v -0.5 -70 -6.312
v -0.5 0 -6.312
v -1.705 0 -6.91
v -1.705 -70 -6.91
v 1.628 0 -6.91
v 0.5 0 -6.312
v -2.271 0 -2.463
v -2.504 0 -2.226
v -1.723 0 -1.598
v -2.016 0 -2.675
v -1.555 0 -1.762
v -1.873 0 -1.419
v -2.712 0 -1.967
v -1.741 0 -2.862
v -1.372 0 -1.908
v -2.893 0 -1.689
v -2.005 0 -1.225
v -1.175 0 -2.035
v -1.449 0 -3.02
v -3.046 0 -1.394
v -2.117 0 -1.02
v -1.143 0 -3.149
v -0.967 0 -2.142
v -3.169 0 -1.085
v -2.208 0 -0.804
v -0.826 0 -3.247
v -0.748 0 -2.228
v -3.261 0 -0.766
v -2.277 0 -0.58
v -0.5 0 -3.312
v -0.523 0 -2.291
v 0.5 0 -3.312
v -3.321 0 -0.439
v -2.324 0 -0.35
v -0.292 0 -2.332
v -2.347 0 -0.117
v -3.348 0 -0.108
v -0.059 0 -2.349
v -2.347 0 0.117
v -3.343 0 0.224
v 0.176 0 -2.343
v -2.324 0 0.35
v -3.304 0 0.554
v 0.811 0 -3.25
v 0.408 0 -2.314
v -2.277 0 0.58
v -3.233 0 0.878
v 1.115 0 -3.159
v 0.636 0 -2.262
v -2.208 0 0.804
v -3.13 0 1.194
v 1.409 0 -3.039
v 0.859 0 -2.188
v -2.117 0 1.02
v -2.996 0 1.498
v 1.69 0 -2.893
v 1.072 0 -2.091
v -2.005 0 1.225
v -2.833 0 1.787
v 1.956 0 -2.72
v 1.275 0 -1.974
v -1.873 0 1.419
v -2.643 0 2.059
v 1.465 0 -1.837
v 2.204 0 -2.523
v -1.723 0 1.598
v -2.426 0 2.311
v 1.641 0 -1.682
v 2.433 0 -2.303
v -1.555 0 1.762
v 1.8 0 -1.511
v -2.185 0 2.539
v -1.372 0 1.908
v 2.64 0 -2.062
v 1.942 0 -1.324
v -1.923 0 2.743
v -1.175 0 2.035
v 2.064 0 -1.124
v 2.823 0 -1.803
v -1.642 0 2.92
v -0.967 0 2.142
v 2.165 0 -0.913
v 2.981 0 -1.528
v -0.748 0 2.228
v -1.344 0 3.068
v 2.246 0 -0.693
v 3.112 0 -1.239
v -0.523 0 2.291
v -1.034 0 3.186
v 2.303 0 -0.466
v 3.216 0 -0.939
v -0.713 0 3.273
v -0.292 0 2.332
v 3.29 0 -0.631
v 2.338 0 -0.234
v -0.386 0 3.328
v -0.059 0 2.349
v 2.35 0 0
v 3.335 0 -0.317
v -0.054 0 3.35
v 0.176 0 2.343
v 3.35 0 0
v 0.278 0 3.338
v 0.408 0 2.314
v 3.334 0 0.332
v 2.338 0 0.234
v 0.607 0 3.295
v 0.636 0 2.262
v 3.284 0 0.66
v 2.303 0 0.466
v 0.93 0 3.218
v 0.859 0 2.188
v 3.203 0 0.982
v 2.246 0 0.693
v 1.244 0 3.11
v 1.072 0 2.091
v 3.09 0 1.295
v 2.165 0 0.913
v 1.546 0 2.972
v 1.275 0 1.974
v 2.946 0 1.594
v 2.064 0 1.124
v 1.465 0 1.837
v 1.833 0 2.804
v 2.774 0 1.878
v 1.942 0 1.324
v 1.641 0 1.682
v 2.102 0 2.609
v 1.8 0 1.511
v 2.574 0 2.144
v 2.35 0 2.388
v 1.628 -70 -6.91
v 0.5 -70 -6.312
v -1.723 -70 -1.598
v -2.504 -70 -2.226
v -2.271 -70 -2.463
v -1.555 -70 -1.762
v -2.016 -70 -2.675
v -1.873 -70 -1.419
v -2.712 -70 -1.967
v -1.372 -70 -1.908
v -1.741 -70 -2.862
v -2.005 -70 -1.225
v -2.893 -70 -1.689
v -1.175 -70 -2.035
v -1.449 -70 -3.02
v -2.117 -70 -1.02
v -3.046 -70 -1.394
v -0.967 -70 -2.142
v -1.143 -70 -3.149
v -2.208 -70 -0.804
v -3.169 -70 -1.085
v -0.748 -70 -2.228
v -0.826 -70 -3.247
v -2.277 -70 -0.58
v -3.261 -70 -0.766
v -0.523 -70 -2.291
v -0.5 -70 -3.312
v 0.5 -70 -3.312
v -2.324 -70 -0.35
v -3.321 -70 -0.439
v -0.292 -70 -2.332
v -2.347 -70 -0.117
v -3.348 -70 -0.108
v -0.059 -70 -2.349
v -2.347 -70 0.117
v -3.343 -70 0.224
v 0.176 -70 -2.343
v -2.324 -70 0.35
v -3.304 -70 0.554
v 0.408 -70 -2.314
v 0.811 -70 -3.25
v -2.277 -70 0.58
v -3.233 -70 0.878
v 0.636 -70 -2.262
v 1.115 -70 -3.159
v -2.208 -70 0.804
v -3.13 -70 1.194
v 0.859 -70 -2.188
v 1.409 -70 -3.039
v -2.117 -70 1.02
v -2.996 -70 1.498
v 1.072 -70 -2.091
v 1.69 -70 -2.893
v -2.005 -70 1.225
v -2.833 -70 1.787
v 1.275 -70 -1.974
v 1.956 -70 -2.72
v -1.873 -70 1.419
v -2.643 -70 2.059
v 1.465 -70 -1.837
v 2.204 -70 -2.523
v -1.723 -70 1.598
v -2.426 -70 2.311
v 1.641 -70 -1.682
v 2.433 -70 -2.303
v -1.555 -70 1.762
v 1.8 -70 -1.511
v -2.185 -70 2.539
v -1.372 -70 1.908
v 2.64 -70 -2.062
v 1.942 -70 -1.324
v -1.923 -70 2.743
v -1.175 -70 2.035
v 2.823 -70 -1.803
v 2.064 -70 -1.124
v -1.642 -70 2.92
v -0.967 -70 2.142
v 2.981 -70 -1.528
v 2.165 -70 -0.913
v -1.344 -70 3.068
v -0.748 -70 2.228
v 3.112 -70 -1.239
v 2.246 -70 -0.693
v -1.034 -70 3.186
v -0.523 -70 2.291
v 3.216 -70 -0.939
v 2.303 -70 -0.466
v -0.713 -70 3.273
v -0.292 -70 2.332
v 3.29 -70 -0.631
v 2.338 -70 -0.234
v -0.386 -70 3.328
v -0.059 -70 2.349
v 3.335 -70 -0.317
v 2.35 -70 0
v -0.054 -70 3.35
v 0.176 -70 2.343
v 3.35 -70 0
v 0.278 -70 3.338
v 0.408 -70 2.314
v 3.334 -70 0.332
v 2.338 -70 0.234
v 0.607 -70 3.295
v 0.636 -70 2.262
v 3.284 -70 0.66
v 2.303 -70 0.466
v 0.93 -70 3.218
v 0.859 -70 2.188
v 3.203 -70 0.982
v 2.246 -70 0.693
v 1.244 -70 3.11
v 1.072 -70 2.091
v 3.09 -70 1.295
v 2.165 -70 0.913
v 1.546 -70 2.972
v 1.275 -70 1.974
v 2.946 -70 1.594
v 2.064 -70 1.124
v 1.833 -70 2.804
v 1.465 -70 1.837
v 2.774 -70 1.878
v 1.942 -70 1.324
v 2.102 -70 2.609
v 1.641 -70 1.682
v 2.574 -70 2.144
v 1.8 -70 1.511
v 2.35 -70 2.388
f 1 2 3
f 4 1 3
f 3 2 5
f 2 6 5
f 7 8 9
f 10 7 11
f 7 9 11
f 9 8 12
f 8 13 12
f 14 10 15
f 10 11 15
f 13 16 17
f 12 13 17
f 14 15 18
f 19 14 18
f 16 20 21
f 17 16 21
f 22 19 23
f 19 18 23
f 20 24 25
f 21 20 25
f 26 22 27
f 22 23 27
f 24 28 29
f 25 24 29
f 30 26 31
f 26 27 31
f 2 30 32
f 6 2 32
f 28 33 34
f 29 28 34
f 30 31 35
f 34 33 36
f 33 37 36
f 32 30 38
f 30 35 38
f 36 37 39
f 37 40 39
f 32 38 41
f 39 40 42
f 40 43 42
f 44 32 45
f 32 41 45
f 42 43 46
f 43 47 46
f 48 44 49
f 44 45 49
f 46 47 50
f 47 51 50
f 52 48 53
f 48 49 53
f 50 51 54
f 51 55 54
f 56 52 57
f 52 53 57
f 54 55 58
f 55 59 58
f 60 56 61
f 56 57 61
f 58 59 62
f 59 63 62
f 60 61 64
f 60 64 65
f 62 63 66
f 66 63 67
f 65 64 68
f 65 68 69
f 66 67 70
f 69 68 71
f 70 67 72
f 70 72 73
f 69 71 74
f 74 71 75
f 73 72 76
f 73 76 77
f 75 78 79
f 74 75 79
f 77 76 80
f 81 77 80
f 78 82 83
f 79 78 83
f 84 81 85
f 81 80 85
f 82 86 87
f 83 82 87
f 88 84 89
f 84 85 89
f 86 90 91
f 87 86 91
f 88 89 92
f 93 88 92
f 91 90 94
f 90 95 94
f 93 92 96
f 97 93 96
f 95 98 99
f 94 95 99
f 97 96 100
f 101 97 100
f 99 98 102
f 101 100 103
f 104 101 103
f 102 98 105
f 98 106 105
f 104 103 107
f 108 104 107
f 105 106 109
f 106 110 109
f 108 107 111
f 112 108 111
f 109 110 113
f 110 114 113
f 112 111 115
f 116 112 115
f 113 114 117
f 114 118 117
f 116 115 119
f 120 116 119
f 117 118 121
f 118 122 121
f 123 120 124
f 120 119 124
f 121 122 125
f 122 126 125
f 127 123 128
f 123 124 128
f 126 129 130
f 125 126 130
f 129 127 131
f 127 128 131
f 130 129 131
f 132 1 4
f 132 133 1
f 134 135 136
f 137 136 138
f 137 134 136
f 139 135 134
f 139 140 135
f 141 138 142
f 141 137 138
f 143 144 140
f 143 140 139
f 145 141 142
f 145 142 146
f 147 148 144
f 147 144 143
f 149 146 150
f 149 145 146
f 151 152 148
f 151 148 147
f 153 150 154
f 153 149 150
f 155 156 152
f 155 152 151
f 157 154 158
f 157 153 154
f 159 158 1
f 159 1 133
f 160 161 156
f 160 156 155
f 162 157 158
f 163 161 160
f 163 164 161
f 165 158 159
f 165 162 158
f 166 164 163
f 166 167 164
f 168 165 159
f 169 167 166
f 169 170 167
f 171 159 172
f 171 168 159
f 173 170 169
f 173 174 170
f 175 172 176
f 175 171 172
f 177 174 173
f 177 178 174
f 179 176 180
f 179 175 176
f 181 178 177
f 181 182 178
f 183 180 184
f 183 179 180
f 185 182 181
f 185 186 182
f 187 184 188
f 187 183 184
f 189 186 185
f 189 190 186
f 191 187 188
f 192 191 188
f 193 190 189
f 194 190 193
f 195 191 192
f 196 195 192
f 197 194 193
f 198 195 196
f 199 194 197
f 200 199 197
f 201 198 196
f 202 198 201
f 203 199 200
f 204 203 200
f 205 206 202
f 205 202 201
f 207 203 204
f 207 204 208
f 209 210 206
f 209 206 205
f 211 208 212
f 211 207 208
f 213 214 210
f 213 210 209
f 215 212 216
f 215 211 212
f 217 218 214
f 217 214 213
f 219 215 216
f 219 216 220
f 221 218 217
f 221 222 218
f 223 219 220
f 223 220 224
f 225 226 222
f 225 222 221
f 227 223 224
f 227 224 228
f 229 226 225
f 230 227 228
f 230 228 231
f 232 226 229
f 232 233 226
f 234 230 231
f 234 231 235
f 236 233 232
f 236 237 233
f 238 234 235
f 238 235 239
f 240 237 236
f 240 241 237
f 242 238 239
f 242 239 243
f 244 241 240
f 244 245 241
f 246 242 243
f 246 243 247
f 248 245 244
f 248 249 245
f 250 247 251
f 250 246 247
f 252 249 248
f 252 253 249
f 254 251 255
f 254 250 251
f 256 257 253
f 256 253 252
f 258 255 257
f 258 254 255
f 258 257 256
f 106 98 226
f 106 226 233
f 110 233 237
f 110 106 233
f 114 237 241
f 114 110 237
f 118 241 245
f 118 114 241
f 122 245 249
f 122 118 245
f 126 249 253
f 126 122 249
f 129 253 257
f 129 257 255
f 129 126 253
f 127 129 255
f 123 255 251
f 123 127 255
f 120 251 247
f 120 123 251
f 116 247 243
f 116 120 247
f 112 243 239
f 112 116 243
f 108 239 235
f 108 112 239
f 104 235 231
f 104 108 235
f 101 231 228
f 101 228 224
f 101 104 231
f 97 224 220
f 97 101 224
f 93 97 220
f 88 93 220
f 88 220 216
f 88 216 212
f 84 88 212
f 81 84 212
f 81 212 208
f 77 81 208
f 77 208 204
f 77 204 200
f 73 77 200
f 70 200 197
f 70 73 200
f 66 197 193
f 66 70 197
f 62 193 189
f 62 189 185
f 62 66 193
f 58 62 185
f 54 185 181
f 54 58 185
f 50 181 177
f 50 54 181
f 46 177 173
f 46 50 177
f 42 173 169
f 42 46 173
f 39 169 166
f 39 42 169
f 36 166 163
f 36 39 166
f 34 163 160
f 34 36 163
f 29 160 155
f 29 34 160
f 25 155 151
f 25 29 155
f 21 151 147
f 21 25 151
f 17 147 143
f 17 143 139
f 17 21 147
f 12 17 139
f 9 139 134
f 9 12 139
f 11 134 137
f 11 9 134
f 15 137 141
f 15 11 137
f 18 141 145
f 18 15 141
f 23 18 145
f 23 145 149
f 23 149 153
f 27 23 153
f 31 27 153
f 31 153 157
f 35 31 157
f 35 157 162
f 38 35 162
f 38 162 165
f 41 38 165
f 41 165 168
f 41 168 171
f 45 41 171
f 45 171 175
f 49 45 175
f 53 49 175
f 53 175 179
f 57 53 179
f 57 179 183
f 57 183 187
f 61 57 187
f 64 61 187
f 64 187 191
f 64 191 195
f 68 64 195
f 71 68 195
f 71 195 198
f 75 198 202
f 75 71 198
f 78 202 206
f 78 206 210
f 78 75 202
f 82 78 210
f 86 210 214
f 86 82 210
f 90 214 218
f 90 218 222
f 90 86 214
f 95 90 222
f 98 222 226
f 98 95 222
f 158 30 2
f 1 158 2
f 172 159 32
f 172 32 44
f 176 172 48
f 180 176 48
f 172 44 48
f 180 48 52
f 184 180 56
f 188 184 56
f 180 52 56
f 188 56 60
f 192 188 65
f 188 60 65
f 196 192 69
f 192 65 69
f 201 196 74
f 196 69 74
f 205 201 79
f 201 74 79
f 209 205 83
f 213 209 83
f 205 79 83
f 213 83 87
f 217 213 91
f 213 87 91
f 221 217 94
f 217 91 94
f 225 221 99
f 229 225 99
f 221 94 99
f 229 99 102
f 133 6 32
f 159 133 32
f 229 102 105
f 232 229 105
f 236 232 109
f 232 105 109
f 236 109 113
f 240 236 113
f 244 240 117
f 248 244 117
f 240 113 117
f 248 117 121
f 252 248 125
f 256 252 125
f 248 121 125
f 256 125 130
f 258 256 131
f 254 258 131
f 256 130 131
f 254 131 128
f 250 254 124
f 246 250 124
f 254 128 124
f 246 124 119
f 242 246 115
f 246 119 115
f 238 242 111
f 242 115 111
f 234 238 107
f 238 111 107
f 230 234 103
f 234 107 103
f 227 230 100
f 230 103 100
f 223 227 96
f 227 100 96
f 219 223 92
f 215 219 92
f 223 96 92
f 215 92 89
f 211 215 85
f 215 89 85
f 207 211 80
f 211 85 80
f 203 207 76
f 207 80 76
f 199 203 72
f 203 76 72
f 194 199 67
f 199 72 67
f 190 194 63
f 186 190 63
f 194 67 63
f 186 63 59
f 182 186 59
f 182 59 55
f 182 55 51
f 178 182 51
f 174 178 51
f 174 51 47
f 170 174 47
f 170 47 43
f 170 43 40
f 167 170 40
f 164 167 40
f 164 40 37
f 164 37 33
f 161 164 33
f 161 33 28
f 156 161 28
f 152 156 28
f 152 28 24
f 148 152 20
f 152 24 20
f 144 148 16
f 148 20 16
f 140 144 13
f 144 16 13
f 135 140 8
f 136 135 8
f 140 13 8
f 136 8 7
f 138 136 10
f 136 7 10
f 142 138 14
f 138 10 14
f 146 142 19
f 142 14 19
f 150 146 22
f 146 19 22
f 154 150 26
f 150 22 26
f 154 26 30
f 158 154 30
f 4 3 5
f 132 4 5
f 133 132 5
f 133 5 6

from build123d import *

# Parameters (mm, degrees)
F0_R     = 2.35
F1_DEPTH = 70


with BuildPart() as f1:
    # F0 (on Front) → F1 (new body)
    with BuildSketch(Plane.XZ):
        with BuildLine():
            ThreePointArc((0.5, -3.312476), (0, -3.35), (-0.5, -3.312476))
            Line((-0.5, -3.312476), (-0.5, -6.312476))
            Line((-0.5, -6.312476), (0.5, -6.312476))
            Line((0.5, -6.312476), (0.5, -3.312476))
        make_face()
        with BuildLine():
            Line((0.5, -3.312476), (-0.5, -3.312476))
            ThreePointArc((-0.5, -3.312476), (0, -3.35), (0.5, -3.312476))
        make_face()
        with BuildLine():
            ThreePointArc((0.5, -3.312476), (2.539439, -2.184891), (3.35, 0))
            ThreePointArc((3.35, 0), (-2.184891, 2.539439), (-0.5, -3.312476))
            Line((-0.5, -3.312476), (0.5, -3.312476))
        make_face()
        Circle(F0_R, mode=Mode.SUBTRACT)
        Polygon((0.5, -6.312476), (-0.5, -6.312476), (-1.705153, -6.910453), (1.628228, -6.910453), align=None)
    extrude(amount=F1_DEPTH)


solid = f1.part
